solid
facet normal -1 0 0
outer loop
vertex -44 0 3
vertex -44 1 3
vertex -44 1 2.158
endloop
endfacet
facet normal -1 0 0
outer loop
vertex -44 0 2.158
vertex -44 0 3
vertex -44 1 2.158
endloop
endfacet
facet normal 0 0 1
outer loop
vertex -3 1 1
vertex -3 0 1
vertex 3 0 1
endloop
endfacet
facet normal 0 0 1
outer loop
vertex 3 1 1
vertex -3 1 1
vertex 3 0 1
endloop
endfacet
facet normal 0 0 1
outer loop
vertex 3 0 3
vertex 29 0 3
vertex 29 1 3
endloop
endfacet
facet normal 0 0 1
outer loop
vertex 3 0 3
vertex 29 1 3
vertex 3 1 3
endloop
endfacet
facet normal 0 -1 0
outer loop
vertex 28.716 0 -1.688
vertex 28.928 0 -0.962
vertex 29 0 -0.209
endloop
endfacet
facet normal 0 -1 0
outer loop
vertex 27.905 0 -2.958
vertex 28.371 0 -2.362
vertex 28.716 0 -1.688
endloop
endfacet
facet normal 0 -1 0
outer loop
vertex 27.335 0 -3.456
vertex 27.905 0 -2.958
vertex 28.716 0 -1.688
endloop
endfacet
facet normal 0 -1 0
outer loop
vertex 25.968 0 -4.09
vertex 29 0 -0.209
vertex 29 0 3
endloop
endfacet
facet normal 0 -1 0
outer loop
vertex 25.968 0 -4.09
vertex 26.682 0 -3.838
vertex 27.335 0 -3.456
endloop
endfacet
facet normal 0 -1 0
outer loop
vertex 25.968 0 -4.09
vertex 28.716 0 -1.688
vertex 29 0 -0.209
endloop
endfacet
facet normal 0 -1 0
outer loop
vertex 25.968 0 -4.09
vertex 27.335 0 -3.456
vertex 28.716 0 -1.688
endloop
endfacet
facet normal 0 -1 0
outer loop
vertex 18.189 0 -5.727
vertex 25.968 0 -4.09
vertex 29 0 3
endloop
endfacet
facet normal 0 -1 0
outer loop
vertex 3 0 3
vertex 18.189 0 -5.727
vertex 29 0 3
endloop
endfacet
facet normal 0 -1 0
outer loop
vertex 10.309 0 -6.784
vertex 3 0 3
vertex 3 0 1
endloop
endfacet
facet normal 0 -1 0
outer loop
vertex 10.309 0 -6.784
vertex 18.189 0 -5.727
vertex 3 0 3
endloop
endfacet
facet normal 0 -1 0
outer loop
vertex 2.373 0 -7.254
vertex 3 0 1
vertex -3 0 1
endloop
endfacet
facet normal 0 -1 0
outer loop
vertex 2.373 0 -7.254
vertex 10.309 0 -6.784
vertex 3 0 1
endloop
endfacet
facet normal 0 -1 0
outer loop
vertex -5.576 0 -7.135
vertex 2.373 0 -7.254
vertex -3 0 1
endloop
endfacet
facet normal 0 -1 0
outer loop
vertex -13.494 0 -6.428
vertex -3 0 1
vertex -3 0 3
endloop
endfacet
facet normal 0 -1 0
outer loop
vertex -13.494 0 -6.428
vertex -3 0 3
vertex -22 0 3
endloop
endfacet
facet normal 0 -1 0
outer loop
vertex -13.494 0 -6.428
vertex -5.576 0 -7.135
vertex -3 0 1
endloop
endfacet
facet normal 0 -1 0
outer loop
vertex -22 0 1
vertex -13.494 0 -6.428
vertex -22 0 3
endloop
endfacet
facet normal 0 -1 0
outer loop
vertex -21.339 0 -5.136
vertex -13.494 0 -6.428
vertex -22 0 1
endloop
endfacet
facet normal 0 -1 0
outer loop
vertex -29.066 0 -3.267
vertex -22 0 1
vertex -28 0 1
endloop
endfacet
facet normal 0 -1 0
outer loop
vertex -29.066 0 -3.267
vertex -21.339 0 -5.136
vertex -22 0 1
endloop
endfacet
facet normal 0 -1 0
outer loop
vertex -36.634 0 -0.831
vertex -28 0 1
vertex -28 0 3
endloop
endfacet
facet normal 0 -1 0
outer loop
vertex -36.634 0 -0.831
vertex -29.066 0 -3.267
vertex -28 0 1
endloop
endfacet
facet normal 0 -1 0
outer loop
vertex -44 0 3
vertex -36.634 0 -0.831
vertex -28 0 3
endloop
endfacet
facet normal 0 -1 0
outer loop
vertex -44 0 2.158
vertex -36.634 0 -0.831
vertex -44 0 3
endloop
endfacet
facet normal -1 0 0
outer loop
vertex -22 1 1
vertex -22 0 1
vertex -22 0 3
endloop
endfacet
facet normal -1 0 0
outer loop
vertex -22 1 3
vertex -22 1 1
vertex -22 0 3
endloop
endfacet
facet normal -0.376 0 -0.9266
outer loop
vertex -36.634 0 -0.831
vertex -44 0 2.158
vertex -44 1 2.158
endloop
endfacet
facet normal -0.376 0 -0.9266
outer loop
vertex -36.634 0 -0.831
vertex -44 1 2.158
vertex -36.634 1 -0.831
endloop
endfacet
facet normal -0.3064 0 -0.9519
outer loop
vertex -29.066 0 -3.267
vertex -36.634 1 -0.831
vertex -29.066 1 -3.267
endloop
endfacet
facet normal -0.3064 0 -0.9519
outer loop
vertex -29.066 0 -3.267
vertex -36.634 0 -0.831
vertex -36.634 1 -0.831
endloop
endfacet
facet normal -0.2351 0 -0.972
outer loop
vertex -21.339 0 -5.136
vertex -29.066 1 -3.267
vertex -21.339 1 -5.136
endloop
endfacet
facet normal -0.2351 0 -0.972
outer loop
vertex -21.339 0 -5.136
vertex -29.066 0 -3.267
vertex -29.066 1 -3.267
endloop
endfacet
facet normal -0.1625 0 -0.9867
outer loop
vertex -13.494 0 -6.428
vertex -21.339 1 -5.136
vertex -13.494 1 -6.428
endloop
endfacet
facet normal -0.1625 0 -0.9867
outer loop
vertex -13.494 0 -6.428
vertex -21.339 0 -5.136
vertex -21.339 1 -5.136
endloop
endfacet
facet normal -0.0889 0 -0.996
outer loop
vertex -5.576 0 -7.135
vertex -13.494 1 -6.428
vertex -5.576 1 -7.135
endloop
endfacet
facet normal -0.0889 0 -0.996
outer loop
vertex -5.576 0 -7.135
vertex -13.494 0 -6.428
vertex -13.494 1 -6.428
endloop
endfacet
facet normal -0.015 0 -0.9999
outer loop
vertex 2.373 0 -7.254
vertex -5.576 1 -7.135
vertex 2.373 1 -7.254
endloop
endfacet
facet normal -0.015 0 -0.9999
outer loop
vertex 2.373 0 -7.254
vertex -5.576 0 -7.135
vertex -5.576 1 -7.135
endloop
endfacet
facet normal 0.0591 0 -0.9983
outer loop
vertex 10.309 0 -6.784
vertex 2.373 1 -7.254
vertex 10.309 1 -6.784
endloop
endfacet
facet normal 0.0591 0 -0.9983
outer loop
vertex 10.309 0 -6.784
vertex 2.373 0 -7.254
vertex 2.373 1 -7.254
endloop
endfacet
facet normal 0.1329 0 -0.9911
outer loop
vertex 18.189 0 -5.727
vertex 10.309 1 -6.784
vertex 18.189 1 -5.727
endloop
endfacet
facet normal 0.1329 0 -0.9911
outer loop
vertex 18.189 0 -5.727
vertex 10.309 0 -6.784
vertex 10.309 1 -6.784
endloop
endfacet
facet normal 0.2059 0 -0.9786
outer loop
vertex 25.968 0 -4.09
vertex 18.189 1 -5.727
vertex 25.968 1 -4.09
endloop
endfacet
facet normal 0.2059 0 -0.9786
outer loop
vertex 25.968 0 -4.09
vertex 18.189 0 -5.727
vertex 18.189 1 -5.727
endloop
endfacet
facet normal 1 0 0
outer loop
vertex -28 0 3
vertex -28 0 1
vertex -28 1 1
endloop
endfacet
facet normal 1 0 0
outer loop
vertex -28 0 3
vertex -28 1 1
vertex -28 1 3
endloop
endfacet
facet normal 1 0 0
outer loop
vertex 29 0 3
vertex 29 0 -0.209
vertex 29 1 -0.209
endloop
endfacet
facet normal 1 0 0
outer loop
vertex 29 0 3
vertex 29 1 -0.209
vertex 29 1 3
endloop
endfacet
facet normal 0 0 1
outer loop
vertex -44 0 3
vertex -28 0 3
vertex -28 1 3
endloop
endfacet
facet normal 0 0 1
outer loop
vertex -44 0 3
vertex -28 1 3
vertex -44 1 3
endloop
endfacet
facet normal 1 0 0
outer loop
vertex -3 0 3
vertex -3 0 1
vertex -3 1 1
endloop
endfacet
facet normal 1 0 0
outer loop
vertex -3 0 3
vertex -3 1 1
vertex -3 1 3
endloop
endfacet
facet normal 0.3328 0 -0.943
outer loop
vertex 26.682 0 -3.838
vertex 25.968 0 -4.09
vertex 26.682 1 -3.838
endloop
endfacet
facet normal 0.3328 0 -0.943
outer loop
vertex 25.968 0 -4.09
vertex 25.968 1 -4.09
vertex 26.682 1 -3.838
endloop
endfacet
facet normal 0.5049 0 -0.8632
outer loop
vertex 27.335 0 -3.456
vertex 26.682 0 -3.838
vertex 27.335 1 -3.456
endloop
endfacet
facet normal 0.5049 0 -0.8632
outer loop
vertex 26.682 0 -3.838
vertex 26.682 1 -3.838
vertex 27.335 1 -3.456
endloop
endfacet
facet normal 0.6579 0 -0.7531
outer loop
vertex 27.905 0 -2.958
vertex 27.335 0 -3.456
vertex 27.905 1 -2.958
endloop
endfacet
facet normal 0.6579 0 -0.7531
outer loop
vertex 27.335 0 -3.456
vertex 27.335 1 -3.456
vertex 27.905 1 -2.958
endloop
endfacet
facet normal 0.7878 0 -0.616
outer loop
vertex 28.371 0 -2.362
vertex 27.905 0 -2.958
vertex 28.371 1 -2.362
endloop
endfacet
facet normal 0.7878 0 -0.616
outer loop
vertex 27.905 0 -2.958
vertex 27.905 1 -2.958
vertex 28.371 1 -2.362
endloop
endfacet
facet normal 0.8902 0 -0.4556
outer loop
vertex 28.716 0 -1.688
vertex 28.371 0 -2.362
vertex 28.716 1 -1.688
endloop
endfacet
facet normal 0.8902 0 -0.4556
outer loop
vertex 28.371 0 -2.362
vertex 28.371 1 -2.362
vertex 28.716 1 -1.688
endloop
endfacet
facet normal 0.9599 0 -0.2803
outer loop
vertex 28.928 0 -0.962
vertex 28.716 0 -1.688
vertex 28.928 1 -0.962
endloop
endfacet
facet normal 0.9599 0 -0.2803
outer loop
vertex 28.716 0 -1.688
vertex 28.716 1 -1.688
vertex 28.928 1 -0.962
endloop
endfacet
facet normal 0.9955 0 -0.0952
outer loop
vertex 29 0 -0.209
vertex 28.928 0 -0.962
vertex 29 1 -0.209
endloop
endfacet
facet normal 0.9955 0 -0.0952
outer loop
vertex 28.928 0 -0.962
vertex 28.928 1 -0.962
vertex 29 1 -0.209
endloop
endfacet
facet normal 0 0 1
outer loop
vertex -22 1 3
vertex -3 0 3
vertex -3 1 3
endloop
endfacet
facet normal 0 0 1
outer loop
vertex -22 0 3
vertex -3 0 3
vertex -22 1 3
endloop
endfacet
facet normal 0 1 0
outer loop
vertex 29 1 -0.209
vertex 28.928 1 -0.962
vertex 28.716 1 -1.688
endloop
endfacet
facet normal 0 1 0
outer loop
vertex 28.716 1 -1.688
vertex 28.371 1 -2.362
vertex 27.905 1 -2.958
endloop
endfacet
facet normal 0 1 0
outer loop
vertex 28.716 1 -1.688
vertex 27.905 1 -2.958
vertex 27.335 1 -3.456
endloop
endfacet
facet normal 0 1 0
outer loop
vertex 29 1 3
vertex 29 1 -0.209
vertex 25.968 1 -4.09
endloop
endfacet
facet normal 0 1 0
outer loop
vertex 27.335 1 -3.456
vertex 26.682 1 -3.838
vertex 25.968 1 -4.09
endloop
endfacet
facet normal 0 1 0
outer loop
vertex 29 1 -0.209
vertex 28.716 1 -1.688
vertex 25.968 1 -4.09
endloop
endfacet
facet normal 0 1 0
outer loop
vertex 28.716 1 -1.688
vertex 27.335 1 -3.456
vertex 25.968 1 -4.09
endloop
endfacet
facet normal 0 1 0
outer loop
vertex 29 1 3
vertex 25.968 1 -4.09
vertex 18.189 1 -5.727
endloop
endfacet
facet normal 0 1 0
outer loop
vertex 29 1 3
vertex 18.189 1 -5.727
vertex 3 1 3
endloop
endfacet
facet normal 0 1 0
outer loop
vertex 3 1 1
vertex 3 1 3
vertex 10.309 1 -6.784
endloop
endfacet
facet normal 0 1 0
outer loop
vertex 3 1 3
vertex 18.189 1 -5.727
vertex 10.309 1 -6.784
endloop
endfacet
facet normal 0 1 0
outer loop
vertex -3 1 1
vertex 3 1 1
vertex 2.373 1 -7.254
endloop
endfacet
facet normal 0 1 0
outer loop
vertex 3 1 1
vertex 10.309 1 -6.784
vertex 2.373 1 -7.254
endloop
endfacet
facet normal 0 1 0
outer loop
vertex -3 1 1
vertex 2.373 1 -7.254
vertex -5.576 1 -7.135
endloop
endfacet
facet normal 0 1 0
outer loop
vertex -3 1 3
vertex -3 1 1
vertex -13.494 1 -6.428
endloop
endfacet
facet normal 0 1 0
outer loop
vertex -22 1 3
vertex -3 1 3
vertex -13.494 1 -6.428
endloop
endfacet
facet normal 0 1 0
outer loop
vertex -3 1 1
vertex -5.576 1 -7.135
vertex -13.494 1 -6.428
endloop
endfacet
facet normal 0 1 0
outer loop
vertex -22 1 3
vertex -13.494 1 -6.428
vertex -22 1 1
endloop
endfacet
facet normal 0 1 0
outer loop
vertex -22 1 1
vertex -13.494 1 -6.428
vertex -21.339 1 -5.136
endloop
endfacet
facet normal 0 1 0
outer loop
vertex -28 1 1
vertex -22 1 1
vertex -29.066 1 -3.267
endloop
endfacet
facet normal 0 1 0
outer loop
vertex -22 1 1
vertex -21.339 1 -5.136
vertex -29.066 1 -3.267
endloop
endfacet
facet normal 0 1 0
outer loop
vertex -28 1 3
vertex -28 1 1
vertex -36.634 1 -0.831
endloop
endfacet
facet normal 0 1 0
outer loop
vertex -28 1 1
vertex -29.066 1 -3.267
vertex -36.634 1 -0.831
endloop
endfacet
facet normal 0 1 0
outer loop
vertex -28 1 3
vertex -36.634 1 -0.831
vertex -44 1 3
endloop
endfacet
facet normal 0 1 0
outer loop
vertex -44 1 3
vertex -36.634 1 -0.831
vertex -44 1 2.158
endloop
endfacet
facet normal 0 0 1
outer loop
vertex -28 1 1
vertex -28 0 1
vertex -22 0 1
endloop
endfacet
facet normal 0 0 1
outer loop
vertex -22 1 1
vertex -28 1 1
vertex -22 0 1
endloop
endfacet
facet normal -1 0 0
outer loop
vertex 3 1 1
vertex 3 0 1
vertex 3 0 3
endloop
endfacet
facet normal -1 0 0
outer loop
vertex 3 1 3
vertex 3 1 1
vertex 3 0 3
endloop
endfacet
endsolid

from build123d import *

# Parameters (mm, degrees)
EXTRUDE_1_DEPTH     = 1
SKETCH_2_W          = 6
SKETCH_2_H          = 4
CUT_EXTRUDE_1_DEPTH = 2
FILLET_1_R          = 4


with BuildPart() as part:
    # 草图1 → 凸台-拉伸1 (new body)
    with BuildSketch(Plane(origin=(0, 0, 0), x_dir=(1, 0, 0), z_dir=(0, 1, 0))):
        with BuildLine():
            Line((-30, -3), (-44, -3))
            Line((-44, -3), (-44, -2.158291102))
            ThreePointArc((-44, -2.158291102), (-7.97872831, 6.982895336), (29, 3.286010669))
            Line((29, 3.286010669), (29, -3))
            Line((29, -3), (0, -3))
            Line((0, -3), (-30, -3))
        make_face()
    extrude(amount=EXTRUDE_1_DEPTH)

    # 草图2 → 切除-拉伸1 (cut, through all)
    with BuildSketch(Plane.XZ):
        with Locations((0, 3)):
            Rectangle(SKETCH_2_W, SKETCH_2_H)
        with Locations((-25, 3)):
            Rectangle(SKETCH_2_W, SKETCH_2_H)
    extrude(amount=-CUT_EXTRUDE_1_DEPTH, mode=Mode.SUBTRACT)

    # 圆角1
    fillet_1_edges = [part.edges().sort_by_distance(p)[0] for p in [
        (29, 0.5, -3.286010669),
    ]]
    fillet(fillet_1_edges, radius=FILLET_1_R)


solid = part.part
